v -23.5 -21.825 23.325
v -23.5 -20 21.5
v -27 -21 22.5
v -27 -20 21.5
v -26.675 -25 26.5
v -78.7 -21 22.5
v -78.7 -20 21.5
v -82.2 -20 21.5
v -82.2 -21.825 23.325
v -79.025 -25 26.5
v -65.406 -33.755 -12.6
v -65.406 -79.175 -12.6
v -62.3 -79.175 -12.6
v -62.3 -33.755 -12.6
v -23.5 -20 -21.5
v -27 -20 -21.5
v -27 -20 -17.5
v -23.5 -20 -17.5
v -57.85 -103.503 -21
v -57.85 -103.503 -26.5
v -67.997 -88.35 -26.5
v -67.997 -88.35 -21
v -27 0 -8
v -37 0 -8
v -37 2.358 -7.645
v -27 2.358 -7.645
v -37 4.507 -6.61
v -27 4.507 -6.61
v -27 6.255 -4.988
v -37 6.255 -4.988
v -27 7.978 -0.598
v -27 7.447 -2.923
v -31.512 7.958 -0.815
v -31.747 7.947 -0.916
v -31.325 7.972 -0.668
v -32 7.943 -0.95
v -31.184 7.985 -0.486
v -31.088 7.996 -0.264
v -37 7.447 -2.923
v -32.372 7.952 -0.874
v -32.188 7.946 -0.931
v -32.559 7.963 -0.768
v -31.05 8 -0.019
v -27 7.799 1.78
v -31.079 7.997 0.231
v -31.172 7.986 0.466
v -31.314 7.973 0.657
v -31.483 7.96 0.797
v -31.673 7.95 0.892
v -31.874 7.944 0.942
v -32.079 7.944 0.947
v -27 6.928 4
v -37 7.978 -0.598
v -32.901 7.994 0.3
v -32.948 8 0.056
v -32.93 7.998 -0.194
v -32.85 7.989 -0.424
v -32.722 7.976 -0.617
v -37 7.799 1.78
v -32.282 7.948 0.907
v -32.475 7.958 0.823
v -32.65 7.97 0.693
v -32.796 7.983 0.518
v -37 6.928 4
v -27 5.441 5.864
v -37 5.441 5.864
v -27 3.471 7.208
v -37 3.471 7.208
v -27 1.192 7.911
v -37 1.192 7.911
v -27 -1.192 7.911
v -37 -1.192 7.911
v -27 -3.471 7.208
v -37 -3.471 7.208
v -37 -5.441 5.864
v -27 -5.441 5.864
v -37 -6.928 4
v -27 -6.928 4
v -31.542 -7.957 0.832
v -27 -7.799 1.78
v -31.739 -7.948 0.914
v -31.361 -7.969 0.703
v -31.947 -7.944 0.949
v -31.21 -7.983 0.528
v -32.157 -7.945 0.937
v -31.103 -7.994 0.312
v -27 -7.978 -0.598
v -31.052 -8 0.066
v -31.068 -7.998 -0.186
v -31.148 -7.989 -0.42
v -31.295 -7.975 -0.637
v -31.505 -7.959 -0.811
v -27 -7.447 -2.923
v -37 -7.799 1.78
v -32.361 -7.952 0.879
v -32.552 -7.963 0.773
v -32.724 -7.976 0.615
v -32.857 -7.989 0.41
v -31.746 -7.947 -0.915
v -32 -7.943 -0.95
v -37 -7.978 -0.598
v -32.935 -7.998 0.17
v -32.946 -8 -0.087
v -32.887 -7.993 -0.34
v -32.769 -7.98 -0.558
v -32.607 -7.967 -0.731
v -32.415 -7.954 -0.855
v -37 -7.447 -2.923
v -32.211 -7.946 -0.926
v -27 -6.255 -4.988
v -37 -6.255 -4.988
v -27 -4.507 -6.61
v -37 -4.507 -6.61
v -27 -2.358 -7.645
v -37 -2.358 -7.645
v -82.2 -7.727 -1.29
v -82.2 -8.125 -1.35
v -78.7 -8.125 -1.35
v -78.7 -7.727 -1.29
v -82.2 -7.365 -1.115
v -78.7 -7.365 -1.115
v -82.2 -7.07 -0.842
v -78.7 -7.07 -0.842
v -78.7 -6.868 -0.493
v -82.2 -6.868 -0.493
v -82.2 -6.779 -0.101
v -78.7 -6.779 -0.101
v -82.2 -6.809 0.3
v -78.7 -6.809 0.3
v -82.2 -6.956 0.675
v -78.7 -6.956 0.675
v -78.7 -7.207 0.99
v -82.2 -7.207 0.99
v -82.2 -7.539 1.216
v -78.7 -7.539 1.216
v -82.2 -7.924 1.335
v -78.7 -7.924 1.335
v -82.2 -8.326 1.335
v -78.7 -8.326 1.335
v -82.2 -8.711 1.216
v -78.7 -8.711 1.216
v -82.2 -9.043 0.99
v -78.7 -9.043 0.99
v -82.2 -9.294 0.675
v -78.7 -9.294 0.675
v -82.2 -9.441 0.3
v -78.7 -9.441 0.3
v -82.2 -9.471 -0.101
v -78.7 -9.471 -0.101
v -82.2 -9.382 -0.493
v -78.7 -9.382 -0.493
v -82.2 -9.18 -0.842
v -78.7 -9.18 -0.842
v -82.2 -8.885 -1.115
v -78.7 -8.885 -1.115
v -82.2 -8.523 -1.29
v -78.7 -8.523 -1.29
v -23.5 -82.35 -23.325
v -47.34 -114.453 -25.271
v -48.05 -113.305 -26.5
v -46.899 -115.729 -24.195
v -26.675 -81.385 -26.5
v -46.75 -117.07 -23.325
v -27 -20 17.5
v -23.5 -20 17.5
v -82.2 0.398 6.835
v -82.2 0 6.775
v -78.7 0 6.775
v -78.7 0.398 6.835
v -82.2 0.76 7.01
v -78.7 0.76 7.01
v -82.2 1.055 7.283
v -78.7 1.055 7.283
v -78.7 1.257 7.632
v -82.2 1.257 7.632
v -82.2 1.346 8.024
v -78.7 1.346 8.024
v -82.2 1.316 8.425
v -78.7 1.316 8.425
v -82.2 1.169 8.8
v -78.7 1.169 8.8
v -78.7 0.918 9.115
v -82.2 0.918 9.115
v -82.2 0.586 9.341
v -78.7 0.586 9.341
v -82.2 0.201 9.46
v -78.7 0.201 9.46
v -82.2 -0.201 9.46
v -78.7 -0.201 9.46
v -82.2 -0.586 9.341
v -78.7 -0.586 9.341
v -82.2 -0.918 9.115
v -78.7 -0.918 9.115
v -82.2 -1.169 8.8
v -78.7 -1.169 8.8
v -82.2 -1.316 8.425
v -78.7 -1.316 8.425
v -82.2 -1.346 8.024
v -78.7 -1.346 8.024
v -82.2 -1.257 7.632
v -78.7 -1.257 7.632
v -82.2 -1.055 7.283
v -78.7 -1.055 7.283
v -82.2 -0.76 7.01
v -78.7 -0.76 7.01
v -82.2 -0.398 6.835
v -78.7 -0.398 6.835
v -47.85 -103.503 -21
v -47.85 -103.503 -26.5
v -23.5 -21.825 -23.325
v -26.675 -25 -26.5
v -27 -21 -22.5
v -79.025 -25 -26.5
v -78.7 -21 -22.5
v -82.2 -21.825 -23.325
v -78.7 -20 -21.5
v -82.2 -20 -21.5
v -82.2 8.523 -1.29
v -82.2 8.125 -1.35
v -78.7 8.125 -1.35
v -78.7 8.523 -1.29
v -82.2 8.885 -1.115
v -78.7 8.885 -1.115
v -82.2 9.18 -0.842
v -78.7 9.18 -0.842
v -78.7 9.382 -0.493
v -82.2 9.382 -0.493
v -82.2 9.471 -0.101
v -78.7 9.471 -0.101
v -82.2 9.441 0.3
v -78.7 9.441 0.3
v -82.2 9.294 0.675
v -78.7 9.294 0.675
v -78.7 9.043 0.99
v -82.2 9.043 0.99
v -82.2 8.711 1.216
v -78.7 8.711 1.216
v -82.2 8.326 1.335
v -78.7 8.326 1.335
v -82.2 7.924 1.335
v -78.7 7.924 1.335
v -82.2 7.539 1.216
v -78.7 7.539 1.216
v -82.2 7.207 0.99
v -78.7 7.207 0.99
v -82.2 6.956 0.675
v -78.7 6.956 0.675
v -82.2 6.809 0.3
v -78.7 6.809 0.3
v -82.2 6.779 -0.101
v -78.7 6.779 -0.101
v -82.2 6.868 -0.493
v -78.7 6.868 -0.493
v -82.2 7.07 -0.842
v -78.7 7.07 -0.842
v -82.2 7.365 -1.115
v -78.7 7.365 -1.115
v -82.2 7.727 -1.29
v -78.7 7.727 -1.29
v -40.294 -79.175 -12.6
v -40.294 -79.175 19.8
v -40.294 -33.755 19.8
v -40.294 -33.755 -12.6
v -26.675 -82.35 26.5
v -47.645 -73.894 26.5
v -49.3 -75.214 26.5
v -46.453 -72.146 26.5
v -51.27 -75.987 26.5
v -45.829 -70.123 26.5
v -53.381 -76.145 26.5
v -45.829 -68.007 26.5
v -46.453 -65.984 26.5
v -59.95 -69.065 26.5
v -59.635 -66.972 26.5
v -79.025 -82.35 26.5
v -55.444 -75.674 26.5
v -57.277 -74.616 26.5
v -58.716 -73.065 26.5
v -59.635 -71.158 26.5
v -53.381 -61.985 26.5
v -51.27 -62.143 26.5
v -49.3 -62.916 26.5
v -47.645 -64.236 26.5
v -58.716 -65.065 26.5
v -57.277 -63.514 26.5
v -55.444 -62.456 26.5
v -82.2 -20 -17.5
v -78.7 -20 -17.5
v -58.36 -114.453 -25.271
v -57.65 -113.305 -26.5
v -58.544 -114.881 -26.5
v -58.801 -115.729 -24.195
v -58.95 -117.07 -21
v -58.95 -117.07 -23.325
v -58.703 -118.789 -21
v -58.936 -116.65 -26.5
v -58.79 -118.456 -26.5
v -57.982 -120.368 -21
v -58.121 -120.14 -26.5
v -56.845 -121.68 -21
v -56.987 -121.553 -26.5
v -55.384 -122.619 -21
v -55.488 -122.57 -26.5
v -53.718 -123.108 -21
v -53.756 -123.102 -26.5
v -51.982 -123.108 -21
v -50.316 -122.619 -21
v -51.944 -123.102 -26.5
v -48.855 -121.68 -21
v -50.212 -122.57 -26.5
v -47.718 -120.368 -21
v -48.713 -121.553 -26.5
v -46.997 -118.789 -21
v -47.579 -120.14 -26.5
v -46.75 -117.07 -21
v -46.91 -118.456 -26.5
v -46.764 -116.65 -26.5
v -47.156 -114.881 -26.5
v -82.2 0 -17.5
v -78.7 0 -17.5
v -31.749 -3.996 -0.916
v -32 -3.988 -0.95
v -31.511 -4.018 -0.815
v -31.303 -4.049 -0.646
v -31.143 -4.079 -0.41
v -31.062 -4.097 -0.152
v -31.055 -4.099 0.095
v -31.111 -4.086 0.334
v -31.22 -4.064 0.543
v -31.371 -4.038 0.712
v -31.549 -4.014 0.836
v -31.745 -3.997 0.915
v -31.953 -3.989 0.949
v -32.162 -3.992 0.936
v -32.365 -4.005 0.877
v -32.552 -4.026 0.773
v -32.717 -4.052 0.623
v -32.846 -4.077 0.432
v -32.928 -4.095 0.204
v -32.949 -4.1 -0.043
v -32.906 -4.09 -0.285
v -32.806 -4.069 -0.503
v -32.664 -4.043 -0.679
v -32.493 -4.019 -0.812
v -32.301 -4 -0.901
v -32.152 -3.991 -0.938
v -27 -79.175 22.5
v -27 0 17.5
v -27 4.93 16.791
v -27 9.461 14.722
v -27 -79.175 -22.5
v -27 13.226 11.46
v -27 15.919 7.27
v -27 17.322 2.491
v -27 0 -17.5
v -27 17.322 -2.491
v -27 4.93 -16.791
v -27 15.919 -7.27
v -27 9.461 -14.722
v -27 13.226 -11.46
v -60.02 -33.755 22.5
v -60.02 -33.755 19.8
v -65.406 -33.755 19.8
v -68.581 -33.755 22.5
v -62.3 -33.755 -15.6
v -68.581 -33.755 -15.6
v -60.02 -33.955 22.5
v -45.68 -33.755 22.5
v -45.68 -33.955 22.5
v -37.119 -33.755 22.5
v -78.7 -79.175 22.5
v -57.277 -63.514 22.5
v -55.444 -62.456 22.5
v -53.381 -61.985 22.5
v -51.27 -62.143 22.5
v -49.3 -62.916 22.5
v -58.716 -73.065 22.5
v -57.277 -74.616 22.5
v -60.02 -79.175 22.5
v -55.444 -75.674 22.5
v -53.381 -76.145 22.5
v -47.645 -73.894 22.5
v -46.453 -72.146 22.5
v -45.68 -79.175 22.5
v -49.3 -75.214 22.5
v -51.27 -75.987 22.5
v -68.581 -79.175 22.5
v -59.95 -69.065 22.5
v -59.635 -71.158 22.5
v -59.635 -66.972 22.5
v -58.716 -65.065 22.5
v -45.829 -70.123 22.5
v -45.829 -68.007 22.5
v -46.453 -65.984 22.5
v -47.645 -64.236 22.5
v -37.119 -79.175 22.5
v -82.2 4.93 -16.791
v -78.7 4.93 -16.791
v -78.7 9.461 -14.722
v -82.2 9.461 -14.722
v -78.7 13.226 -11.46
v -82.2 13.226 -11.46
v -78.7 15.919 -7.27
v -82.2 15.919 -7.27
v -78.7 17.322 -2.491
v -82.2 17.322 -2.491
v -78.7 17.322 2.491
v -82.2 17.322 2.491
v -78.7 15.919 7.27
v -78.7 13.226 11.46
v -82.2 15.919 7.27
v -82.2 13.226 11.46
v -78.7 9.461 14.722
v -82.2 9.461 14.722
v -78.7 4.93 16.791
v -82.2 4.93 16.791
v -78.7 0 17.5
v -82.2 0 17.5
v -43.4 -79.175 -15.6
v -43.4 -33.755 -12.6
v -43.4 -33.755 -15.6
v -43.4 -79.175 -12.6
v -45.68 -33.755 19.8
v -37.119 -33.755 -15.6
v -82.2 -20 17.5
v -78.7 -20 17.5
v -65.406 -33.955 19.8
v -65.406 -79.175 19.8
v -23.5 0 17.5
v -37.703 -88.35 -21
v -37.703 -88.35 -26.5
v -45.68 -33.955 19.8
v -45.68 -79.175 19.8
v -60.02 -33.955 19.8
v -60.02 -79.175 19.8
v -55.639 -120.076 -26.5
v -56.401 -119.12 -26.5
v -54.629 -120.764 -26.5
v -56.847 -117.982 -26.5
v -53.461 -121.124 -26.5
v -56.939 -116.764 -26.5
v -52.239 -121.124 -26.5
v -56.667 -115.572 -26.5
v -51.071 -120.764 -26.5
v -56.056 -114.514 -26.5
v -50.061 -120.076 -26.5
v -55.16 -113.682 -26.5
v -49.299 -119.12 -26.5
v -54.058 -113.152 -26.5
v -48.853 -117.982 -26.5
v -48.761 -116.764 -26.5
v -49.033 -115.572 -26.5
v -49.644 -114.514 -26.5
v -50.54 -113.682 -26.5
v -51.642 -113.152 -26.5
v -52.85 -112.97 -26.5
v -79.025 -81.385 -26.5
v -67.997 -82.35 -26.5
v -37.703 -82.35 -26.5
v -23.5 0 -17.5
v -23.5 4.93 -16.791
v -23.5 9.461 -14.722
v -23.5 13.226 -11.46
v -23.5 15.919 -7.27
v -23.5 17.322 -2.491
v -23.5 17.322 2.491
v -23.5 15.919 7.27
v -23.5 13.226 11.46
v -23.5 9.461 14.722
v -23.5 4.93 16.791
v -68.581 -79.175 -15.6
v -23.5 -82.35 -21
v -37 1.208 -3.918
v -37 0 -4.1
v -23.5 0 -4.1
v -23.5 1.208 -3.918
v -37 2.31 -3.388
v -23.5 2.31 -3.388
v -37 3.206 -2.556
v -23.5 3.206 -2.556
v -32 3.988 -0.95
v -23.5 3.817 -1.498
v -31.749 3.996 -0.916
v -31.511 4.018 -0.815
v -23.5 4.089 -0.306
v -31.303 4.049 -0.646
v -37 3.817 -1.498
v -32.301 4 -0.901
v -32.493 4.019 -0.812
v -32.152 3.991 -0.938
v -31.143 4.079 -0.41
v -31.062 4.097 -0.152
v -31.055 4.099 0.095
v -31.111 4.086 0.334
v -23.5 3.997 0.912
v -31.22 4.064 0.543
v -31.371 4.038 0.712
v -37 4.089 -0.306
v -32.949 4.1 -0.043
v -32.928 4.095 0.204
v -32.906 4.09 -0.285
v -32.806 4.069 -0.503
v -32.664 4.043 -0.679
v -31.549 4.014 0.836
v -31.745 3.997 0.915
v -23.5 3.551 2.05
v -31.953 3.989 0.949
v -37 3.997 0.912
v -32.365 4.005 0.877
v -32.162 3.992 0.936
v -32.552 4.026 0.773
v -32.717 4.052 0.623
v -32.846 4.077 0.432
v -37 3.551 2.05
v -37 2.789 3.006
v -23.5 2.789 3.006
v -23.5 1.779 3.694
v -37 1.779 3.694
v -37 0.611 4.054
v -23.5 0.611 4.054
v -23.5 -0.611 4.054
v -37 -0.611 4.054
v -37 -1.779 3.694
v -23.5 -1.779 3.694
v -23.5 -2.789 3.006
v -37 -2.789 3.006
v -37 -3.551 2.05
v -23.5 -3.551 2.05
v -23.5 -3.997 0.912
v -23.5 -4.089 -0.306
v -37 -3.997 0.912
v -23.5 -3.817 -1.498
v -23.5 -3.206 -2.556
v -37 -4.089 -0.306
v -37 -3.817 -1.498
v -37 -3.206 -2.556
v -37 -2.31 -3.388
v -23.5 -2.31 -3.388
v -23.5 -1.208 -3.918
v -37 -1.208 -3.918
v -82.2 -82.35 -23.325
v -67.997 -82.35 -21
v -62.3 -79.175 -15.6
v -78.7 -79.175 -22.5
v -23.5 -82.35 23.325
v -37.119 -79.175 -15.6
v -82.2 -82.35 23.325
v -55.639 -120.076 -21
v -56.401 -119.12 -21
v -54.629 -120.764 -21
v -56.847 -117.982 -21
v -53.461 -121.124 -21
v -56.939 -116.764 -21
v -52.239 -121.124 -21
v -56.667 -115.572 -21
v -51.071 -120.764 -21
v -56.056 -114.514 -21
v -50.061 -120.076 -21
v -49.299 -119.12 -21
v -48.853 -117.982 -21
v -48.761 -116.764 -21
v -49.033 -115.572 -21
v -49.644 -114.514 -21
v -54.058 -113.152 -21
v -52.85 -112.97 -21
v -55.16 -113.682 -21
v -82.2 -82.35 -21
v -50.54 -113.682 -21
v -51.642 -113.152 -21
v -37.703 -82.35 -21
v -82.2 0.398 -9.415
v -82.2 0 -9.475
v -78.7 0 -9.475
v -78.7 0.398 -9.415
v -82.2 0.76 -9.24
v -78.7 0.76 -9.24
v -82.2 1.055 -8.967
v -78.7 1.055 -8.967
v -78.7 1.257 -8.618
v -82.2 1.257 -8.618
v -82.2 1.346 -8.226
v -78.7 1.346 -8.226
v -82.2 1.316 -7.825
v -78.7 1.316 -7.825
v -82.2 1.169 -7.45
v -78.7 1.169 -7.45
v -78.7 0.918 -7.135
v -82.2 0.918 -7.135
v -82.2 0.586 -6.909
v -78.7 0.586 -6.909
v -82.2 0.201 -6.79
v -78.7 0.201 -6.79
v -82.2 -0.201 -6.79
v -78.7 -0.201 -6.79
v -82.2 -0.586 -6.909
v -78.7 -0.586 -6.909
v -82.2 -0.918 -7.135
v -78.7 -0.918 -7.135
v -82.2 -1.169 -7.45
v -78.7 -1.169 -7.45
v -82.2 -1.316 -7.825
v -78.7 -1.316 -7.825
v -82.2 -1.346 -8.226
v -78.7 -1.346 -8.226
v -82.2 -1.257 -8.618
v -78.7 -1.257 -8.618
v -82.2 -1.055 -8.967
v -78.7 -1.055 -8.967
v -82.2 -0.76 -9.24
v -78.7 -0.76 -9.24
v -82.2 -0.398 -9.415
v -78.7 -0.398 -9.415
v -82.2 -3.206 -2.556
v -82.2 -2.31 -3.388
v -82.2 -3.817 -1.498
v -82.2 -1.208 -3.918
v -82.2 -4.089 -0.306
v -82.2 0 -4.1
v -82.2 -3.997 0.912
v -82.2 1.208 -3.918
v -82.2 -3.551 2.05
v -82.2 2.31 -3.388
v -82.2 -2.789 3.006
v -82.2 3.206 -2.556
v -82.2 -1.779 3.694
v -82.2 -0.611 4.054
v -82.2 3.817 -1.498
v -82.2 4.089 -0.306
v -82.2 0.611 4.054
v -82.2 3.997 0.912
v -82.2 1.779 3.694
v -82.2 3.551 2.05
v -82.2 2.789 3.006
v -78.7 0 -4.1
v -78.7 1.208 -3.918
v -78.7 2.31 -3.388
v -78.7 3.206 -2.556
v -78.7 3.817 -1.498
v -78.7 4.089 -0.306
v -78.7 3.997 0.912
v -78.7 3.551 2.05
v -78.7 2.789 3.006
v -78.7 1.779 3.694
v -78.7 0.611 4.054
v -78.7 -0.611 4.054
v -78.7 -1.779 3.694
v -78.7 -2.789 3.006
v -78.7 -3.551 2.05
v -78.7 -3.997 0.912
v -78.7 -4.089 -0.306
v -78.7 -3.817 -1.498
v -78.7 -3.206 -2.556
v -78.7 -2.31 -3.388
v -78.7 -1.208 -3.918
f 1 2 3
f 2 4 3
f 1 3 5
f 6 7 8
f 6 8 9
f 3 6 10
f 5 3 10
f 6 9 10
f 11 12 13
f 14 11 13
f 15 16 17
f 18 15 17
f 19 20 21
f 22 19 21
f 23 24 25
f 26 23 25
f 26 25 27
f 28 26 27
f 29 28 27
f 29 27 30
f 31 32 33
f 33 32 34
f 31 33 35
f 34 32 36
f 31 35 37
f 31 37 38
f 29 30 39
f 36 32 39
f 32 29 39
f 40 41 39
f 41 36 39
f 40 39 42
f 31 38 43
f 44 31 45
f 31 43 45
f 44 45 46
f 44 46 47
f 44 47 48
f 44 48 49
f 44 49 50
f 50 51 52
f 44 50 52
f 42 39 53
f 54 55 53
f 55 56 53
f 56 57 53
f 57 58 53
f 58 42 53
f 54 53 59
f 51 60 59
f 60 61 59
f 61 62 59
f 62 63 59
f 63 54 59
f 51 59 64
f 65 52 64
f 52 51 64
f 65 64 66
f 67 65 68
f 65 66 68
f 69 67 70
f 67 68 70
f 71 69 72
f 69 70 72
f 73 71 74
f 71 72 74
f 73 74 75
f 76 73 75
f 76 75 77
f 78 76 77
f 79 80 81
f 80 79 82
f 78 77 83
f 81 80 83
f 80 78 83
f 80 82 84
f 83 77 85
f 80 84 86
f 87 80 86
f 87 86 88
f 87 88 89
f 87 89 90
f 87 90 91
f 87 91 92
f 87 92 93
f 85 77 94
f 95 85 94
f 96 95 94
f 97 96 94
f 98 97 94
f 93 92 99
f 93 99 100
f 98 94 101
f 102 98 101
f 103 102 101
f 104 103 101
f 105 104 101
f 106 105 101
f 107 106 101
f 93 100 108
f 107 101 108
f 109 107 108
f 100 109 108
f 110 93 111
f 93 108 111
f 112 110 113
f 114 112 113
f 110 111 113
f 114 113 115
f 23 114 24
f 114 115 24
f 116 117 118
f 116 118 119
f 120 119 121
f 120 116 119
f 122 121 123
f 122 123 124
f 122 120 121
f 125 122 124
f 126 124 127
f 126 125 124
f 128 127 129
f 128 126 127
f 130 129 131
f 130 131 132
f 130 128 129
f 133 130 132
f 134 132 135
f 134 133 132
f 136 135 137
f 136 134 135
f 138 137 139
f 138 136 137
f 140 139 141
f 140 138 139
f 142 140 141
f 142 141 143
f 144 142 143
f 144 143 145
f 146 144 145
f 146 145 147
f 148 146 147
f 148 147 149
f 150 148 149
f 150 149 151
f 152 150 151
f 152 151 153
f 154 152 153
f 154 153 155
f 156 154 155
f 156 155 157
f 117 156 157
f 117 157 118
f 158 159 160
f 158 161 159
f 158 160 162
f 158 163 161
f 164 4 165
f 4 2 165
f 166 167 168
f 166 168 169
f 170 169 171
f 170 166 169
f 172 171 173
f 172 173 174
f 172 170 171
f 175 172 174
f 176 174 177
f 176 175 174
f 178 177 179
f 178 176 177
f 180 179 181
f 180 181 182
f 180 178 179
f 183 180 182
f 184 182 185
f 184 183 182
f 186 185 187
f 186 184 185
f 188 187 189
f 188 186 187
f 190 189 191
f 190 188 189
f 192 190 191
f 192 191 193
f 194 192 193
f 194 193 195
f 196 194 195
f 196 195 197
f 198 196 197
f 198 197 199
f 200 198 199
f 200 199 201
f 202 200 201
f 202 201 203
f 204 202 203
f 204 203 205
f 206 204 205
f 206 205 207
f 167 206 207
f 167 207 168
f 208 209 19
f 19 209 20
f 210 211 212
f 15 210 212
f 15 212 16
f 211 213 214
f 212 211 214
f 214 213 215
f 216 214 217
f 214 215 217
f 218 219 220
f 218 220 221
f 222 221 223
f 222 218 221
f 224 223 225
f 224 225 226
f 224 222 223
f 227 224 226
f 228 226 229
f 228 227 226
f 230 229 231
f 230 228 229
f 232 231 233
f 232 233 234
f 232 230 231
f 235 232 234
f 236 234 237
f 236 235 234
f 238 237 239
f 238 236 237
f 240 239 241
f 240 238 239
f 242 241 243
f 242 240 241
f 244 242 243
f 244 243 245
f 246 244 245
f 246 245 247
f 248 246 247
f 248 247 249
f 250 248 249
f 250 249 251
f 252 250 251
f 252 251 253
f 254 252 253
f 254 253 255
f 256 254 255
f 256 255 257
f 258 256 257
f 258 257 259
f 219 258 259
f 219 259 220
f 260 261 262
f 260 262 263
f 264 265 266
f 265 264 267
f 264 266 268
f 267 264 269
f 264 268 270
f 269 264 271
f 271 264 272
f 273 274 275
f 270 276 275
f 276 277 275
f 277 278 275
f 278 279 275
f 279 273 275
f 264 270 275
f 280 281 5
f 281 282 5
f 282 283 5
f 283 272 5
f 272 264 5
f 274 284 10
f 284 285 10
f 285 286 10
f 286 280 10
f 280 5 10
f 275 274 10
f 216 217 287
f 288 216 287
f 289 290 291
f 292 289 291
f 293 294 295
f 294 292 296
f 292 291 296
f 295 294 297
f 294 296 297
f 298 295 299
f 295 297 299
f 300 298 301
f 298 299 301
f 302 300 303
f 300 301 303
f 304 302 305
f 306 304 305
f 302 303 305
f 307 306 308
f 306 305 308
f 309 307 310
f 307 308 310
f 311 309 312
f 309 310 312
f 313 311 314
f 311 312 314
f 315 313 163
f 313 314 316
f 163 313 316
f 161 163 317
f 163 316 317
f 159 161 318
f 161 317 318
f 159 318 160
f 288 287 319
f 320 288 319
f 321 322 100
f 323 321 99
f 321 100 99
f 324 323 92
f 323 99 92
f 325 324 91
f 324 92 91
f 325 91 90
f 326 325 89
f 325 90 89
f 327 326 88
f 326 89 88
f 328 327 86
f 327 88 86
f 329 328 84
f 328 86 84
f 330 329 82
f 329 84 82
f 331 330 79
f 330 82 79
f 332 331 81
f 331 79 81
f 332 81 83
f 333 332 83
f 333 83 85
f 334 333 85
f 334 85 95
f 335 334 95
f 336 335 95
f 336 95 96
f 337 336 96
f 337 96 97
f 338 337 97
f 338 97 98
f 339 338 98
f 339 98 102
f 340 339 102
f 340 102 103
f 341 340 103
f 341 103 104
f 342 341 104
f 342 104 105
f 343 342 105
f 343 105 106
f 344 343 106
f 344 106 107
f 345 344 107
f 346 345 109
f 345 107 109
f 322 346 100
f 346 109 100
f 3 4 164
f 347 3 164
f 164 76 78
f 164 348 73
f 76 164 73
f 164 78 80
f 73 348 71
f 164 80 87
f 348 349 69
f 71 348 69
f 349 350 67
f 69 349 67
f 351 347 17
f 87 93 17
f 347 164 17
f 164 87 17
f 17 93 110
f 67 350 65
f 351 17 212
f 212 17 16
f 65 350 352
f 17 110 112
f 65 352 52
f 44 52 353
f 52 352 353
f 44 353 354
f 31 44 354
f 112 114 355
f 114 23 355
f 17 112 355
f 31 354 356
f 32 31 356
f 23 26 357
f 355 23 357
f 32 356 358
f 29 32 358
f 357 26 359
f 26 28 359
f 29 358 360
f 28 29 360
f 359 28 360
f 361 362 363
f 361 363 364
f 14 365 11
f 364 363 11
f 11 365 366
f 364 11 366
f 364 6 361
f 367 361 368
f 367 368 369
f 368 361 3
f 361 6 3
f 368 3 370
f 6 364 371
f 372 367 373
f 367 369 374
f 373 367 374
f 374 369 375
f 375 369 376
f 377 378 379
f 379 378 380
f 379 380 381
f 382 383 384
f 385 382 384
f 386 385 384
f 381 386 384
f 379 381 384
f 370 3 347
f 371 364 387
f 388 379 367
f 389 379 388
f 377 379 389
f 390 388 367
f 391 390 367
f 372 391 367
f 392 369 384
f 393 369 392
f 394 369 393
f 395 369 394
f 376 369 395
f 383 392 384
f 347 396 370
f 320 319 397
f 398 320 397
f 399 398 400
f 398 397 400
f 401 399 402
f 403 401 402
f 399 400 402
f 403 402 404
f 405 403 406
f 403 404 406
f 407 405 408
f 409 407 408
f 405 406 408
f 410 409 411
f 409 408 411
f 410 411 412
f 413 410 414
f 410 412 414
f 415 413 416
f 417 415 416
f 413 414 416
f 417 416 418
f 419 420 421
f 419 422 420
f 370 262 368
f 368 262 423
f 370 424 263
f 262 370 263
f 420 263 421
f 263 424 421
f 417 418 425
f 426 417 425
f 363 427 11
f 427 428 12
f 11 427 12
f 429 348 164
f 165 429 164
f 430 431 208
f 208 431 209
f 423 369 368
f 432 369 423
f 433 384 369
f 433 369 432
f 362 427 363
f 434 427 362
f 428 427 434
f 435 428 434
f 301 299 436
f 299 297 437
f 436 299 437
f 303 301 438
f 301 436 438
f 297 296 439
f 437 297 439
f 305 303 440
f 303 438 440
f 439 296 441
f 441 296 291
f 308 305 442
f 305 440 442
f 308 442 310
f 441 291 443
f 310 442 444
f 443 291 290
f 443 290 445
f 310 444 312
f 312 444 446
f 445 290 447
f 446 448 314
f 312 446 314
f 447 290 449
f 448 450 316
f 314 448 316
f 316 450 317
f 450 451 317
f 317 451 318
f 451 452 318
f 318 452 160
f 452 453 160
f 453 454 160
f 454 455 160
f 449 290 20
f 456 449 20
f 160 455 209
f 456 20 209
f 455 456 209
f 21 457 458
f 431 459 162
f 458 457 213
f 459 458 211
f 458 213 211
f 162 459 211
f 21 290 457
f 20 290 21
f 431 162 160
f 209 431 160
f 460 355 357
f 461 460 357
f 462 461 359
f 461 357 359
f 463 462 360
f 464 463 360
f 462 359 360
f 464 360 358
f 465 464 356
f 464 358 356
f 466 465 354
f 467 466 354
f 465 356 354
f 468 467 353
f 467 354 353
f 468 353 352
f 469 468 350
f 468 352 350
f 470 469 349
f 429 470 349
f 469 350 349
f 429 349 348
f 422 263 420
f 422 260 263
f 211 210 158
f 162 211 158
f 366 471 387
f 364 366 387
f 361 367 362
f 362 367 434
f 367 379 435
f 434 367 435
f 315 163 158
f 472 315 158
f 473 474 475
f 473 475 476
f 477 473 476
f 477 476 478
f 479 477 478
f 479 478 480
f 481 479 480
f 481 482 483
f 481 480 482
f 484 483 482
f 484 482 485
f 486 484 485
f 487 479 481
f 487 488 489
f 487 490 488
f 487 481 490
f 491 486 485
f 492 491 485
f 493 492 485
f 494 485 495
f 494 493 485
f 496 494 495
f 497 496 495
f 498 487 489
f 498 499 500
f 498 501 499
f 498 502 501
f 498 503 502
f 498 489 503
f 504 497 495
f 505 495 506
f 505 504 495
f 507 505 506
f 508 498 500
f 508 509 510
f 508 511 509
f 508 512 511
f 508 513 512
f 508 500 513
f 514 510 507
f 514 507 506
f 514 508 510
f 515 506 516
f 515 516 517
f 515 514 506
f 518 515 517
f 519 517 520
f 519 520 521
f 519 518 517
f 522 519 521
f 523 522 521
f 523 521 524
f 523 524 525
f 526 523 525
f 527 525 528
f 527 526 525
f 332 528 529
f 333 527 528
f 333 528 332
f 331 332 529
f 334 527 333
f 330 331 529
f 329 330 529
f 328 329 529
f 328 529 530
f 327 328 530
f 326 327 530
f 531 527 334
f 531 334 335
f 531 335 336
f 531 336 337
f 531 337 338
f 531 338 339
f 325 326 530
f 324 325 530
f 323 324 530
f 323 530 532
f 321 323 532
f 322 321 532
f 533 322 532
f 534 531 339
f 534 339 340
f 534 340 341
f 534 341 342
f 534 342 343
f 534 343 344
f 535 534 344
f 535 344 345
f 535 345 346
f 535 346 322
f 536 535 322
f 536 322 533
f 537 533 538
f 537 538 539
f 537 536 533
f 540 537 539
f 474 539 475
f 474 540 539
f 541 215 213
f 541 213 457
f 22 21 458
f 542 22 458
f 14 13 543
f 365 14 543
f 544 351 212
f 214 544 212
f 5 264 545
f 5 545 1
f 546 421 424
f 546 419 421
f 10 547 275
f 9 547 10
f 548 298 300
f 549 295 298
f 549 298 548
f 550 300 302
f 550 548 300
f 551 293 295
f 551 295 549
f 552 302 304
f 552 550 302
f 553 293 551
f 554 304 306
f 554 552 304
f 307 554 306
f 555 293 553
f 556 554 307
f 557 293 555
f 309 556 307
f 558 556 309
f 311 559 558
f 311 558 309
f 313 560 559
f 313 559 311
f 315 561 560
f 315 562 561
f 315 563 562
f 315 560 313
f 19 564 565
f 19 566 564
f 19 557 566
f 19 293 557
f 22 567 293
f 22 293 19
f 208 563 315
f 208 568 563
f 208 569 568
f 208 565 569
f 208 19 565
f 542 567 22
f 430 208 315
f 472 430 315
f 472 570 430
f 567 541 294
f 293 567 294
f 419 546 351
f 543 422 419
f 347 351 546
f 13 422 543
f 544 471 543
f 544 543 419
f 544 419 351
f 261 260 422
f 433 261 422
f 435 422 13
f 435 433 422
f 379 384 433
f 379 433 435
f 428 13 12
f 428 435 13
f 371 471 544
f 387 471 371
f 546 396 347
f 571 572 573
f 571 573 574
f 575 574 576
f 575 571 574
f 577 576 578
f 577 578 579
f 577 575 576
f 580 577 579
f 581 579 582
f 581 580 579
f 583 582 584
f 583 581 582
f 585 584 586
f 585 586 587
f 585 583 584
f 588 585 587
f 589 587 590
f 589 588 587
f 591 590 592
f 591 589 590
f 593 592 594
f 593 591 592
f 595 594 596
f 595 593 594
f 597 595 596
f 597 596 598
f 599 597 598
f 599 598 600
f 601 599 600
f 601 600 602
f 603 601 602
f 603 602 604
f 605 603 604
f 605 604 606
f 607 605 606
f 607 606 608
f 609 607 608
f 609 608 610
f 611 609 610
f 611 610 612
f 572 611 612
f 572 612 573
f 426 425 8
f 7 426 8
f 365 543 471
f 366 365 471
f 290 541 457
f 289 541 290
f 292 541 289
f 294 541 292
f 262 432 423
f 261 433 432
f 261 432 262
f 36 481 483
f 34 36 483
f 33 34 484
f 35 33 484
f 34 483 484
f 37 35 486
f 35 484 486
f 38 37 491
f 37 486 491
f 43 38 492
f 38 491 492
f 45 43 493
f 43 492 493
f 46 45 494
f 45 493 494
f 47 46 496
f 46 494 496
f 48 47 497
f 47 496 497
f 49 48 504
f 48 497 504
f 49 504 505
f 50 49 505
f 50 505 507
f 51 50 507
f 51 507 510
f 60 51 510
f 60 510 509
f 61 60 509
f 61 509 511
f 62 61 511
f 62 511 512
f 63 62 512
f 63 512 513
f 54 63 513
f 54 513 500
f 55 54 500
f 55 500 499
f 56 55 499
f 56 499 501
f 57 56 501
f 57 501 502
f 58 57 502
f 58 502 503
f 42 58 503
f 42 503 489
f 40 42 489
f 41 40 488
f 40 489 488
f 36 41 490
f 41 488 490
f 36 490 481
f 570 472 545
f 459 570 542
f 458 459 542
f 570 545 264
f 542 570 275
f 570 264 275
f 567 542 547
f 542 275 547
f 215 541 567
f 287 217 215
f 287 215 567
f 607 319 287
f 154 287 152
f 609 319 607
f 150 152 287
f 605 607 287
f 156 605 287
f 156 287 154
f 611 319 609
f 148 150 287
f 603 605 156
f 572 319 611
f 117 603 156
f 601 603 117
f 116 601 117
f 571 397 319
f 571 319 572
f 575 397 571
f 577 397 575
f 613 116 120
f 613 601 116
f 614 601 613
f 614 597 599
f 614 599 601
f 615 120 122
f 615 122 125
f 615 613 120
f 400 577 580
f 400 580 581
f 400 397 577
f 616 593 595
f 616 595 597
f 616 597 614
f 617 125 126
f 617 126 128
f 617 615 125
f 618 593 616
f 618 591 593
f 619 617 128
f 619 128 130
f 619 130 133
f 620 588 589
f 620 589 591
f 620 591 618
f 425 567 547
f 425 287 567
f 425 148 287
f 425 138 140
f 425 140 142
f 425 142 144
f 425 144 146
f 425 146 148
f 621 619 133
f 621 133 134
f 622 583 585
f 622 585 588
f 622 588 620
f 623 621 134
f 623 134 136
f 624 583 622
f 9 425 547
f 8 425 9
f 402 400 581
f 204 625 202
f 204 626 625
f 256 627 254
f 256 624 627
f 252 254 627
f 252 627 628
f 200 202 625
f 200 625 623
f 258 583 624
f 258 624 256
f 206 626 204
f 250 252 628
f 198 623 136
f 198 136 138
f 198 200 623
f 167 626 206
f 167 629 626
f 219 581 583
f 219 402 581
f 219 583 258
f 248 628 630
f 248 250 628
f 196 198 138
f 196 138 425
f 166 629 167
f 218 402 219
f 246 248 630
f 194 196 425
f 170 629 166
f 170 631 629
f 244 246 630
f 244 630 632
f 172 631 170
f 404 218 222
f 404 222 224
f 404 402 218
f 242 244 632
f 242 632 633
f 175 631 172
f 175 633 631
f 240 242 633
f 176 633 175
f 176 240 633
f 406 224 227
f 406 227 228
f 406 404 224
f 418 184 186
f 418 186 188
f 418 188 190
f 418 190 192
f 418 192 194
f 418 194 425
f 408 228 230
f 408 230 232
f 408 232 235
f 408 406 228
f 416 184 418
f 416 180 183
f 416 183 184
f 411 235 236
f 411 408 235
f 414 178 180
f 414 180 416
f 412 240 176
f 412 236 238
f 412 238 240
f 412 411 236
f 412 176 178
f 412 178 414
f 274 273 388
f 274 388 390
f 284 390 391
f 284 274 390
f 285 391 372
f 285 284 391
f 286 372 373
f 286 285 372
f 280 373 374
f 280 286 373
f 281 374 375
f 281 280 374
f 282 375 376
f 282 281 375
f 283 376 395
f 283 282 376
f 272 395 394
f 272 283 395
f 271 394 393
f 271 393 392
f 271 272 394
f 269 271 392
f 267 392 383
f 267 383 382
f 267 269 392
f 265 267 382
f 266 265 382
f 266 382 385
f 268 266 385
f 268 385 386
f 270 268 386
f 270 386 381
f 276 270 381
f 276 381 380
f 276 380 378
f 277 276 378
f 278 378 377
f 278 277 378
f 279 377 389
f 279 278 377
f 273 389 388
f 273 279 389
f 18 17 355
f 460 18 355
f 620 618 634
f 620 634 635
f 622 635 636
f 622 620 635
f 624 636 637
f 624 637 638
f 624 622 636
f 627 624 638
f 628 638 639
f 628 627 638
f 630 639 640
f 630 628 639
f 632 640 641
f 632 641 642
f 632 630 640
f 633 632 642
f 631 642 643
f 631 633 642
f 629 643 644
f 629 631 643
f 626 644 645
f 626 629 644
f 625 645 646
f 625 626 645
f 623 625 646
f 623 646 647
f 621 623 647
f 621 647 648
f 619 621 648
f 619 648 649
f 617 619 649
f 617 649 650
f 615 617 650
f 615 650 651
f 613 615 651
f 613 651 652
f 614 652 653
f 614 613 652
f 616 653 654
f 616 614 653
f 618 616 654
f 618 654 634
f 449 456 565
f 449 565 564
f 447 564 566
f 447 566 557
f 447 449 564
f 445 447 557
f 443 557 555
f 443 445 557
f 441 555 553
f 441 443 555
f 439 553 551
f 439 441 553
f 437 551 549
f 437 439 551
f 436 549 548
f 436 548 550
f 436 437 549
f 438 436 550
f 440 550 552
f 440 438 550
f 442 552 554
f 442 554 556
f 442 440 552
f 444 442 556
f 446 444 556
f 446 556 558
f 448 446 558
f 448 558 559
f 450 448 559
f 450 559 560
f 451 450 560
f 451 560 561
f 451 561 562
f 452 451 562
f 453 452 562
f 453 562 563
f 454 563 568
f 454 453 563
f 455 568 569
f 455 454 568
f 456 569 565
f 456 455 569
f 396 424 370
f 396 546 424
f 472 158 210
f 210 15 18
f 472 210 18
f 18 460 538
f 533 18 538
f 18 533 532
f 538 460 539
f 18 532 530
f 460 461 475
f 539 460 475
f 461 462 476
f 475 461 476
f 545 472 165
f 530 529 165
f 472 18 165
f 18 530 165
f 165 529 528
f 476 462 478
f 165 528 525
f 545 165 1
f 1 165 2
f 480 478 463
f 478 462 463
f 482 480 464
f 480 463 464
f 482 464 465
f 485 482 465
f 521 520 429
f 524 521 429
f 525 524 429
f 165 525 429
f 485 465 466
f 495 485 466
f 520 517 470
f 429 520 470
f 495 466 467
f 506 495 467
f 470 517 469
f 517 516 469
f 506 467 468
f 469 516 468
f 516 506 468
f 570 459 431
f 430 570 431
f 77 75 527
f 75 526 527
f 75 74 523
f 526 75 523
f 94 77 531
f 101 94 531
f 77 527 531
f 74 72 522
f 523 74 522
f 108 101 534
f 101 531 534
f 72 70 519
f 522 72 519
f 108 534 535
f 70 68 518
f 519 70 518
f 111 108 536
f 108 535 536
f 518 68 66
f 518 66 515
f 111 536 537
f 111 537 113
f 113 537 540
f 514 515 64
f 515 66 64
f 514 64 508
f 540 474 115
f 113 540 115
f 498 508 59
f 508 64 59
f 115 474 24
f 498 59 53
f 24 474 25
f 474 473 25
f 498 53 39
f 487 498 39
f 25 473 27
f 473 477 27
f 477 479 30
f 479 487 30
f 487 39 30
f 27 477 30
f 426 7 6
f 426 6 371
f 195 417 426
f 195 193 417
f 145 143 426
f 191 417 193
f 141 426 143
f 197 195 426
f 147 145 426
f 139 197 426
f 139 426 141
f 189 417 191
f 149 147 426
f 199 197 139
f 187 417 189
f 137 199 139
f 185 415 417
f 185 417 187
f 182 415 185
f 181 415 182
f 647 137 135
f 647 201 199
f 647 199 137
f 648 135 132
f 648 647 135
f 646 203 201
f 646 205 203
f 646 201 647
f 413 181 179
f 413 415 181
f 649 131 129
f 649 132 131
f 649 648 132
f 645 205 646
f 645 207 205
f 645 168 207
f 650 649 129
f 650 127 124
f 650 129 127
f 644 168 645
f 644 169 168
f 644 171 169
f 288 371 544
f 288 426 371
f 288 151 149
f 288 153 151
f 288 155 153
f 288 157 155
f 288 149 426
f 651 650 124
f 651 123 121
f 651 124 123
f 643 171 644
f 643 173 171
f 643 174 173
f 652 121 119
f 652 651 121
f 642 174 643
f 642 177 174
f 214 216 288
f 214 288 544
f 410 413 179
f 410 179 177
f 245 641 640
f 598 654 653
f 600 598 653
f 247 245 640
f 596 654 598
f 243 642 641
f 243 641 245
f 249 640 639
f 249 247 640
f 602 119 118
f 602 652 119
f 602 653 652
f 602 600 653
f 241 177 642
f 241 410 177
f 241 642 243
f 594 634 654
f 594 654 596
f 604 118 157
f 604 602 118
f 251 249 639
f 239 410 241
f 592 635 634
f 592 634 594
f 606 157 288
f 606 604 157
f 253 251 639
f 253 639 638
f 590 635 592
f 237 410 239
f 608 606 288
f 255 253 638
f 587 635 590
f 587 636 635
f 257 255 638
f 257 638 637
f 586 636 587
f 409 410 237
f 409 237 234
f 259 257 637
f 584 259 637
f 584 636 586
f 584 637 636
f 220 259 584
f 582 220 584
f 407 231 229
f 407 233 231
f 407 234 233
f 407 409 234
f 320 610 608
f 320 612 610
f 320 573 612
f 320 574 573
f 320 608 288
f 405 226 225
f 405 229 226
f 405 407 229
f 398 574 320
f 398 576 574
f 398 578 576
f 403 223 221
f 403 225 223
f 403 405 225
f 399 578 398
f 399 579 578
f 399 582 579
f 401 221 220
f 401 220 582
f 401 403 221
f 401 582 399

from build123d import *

# Parameters (mm, degrees)
SKETCH1_R                = 4.1
BOSS_EXTRUDE1_DEPTH      = 3.5
BOSS_EXTRUDE2_DEPTH      = 51.7
BOSS_EXTRUDE2_DEPTH_BACK = 3.5
CHAMFER2_SIZE            = 5
CUT_EXTRUDE1_REACH       = 112.079
SKETCH4_W                = 51.7
SKETCH4_H                = 45
BOSS_EXTRUDE3_START      = 3.5
SKETCH5_R                = 4.1
BOSS_EXTRUDE3_DEPTH      = 3.5
CUT_EXTRUDE3_REACH       = 104.062
SKETCH9_R                = 1.35
SKETCH10_W               = 58.7
SKETCH10_H               = 53
BOSS_EXTRUDE5_DEPTH      = 3.175
SKETCH26_R               = 7.1
CUT_EXTRUDE6_DEPTH       = 4
SKETCH27_W               = 3.175
SKETCH27_H               = 34.600130378
BOSS_EXTRUDE6_DEPTH      = 45.22
SKETCH29_R               = 4.1
BOSS_EXTRUDE8_DEPTH      = 5.5
CHAMFER3_SIZE            = 3.175
BOSS_EXTRUDE9_START      = 10
SKETCH30_R               = 8
SKETCH30_R_2             = 4.1
BOSS_EXTRUDE9_DEPTH      = 10
SKETCH31_R               = 0.95
CUT_EXTRUDE7_DEPTH       = 120.972242206
BOSS_EXTRUDE10_DEPTH     = 45.22
SKETCH33_W               = 5.386290257
SKETCH33_H               = 2.7
BOSS_EXTRUDE11_DEPTH     = 45.22
BOSS_EXTRUDE12_DEPTH     = 0.2


with BuildPart() as part:
    # Sketch1 → Boss-Extrude1 (new body)
    with BuildSketch(Plane(origin=(0, 0, 0), x_dir=(0, 0, -1), z_dir=(1, 0, 0))):
        with BuildLine():
            Line((-17.5, 0), (-17.5, -20))
            Line((-17.5, -20), (-22.5, -20))
            Line((-22.5, -20), (-22.5, -76))
            Line((-22.5, -76), (22.5, -76))
            Line((22.5, -76), (22.5, -20))
            Line((22.5, -20), (17.5, -20))
            Line((17.5, -20), (17.5, 0))
            ThreePointArc((17.5, 0), (0, 17.5), (-17.5, 0))
        make_face()
        Circle(SKETCH1_R, mode=Mode.SUBTRACT)
    extrude(amount=-BOSS_EXTRUDE1_DEPTH)

    # Sketch2 → Boss-Extrude2 (add, two sides: drawn at the far end of the back side and taken through both)
    with BuildSketch(Plane(origin=(0, 0, 0), x_dir=(0, 0, -1), z_dir=(1, 0, 0)).offset(-BOSS_EXTRUDE2_DEPTH_BACK)):
        Polygon((-22.5, -20), (-22.5, -76), (22.5, -76), (22.5, -20), (26.5, -20), (26.5, -79.175), (-26.5, -79.175), (-26.5, -20), align=None)
    extrude(amount=BOSS_EXTRUDE2_DEPTH + BOSS_EXTRUDE2_DEPTH_BACK)

    # Chamfer2
    chamfer2_edges = [part.edges().sort_by_distance(p)[0] for p in [
        (24.1, -20, -26.5),
        (24.1, -20, 26.5),
    ]]
    chamfer(chamfer2_edges, length=CHAMFER2_SIZE)

    # Sketch4 → Cut-Extrude1 (cut, up to next)
    with BuildSketch(Plane(origin=(0, -76, 0), x_dir=(1, 0, 0), z_dir=(0, 1, 0)), mode=Mode.PRIVATE) as cut_extrude1_sk1:
        with Locations((25.85, 0)):
            Rectangle(SKETCH4_W, SKETCH4_H)
    cut_extrude1_tool1 = extrude(cut_extrude1_sk1.sketch, amount=-CUT_EXTRUDE1_REACH, mode=Mode.PRIVATE) & part.part
    add(cut_extrude1_tool1.solids().sort_by_distance((25.85, -76, 0))[0], mode=Mode.SUBTRACT)

    # Sketch5 → Boss-Extrude3 (add)
    with BuildSketch(Plane(origin=(51.7, 0, 0), x_dir=(0, 0, -1), z_dir=(1, 0, 0)).offset(BOSS_EXTRUDE3_START)):
        with BuildLine():
            Line((21.5, -20), (17.5, -20))
            Line((17.5, -20), (17.5, 0))
            ThreePointArc((17.5, 0), (0, 17.5), (-17.5, 0))
            Line((-17.5, 0), (-17.5, -20))
            Line((-17.5, -20), (-21.5, -20))
            Line((-21.5, -20), (-26.5, -25))
            Line((-26.5, -25), (-26.5, -79.175))
            Line((-26.5, -79.175), (26.5, -79.175))
            Line((26.5, -79.175), (26.5, -25))
            Line((26.5, -25), (21.5, -20))
        make_face()
        Circle(SKETCH5_R, mode=Mode.SUBTRACT)
    extrude(amount=-BOSS_EXTRUDE3_DEPTH)

    # Sketch9 → Cut-Extrude3 (cut, up to next)
    with BuildSketch(Plane(origin=(55.2, 0, 0), x_dir=(0, 0, -1), z_dir=(1, 0, 0)), mode=Mode.PRIVATE) as cut_extrude3_sk1:
        with Locations((0, 8.125)):
            Circle(SKETCH9_R)
    cut_extrude3_tool1 = extrude(cut_extrude3_sk1.sketch, amount=-CUT_EXTRUDE3_REACH, mode=Mode.PRIVATE) & part.part
    # Sketch9 → Cut-Extrude3 (cut, up to next)
    with BuildSketch(Plane(origin=(55.2, 0, 0), x_dir=(0, 0, -1), z_dir=(1, 0, 0)), mode=Mode.PRIVATE) as cut_extrude3_sk2:
        with Locations((8.125, 0)):
            Circle(SKETCH9_R)
    cut_extrude3_tool2 = extrude(cut_extrude3_sk2.sketch, amount=-CUT_EXTRUDE3_REACH, mode=Mode.PRIVATE) & part.part
    # Sketch9 → Cut-Extrude3 (cut, up to next)
    with BuildSketch(Plane(origin=(55.2, 0, 0), x_dir=(0, 0, -1), z_dir=(1, 0, 0)), mode=Mode.PRIVATE) as cut_extrude3_sk3:
        with Locations((0, -8.125)):
            Circle(SKETCH9_R)
    cut_extrude3_tool3 = extrude(cut_extrude3_sk3.sketch, amount=-CUT_EXTRUDE3_REACH, mode=Mode.PRIVATE) & part.part
    # Sketch9 → Cut-Extrude3 (cut, up to next)
    with BuildSketch(Plane(origin=(55.2, 0, 0), x_dir=(0, 0, -1), z_dir=(1, 0, 0)), mode=Mode.PRIVATE) as cut_extrude3_sk4:
        with Locations((-8.125, 0)):
            Circle(SKETCH9_R)
    cut_extrude3_tool4 = extrude(cut_extrude3_sk4.sketch, amount=-CUT_EXTRUDE3_REACH, mode=Mode.PRIVATE) & part.part
    add(cut_extrude3_tool1.solids().sort_by_distance((55.2, 8.125, 0))[0], mode=Mode.SUBTRACT)
    add(cut_extrude3_tool2.solids().sort_by_distance((55.2, 0, -8.125))[0], mode=Mode.SUBTRACT)
    add(cut_extrude3_tool3.solids().sort_by_distance((55.2, -8.125, 0))[0], mode=Mode.SUBTRACT)
    add(cut_extrude3_tool4.solids().sort_by_distance((55.2, 0, 8.125))[0], mode=Mode.SUBTRACT)

    # Sketch10 → Boss-Extrude5 (add)
    with BuildSketch(Plane.XZ.offset(79.175)):
        with Locations((25.85, 0)):
            Rectangle(SKETCH10_W, SKETCH10_H)
    extrude(amount=BOSS_EXTRUDE5_DEPTH)

    # Sketch26 → Cut-Extrude6 (cut)
    with BuildSketch(Plane.XY.offset(26.5)):
        with Locations((25.85, -69.065)):
            Circle(SKETCH26_R)
    extrude(amount=-CUT_EXTRUDE6_DEPTH, mode=Mode.SUBTRACT)

    # Sketch27 → Boss-Extrude6 (add)
    with BuildSketch(Plane(origin=(0, -79.175, 0), x_dir=(1, 0, 0), z_dir=(0, 1, 0))):
        with Locations((39.993724488, -5.199934811)):
            Rectangle(SKETCH27_W, SKETCH27_H)
        with Locations((11.706275512, -5.199934811)):
            Rectangle(SKETCH27_W, SKETCH27_H)
    extrude(amount=BOSS_EXTRUDE6_DEPTH)

    # Sketch29 → Boss-Extrude8 (add)
    with BuildSketch(Plane(origin=(0, 0, -26.5), x_dir=(-1, 0, 0), z_dir=(0, 0, -1))):
        with BuildLine():
            Line((-40.997321429, -82.35), (-55.2, -82.35))
            Line((-55.2, -82.35), (-31.95, -117.07))
            ThreePointArc((-31.95, -117.07), (-25.85, -123.17), (-19.75, -117.07))
            Line((-19.75, -117.07), (3.5, -82.35))
            Line((3.5, -82.35), (-10.702678571, -82.35))
            Line((-10.702678571, -82.35), (-10.702678571, -88.35))
            Line((-10.702678571, -88.35), (-20.85, -103.503333333))
            Line((-20.85, -103.503333333), (-30.85, -103.503333333))
            Line((-30.85, -103.503333333), (-40.997321429, -88.35))
            Line((-40.997321429, -88.35), (-40.997321429, -82.35))
        make_face()
        with Locations(Location((-25.85, -117.07, 0), (0, 0, 90))):
            Circle(SKETCH29_R, mode=Mode.SUBTRACT)
    extrude(amount=-BOSS_EXTRUDE8_DEPTH)

    # Chamfer3
    chamfer3_edges = [part.edges().sort_by_distance(p)[0] for p in [
        (43.575, -99.71, -26.5),
        (8.125, -99.71, -26.5),
        (-3.5, -53.675, -26.5),
        (-3.5, -53.675, 26.5),
        (55.2, -53.675, 26.5),
        (55.2, -53.675, -26.5),
    ]]
    chamfer(chamfer3_edges, length=CHAMFER3_SIZE)

    # Sketch30 → Boss-Extrude9 (add)
    with BuildSketch(Plane(origin=(0, 0, 0), x_dir=(0, 0, -1), z_dir=(1, 0, 0)).offset(BOSS_EXTRUDE9_START)):
        Circle(SKETCH30_R)
        Circle(SKETCH30_R_2, mode=Mode.SUBTRACT)
    extrude(amount=-BOSS_EXTRUDE9_DEPTH)

    # Sketch31 → Cut-Extrude7 (cut, through all)
    with BuildSketch(Plane(origin=(0, -20, 0), x_dir=(1, 0, 0), z_dir=(0, 1, 0))):
        with Locations(Location((5, 0, 0), (0, 0, 90))):
            Circle(SKETCH31_R)
    extrude(amount=CUT_EXTRUDE7_DEPTH, mode=Mode.SUBTRACT)

    # Sketch32 → Boss-Extrude10 (add)
    with BuildSketch(Plane(origin=(0, -79.175, 0), x_dir=(1, 0, 0), z_dir=(0, 1, 0))):
        Polygon((13.293775512, 12.600036526), (16.4, 12.600036526), (16.4, 15.600130378), (10.118775512, 15.600130378), (10.118775512, 12.100130378), (13.293775512, 12.100130378), align=None)
    boss_extrude10 = extrude(amount=BOSS_EXTRUDE10_DEPTH)

    # Sketch33 → Boss-Extrude11 (add)
    with BuildSketch(Plane(origin=(0, -79.175, 0), x_dir=(1, 0, 0), z_dir=(0, 1, 0))):
        with Locations((15.986920641, -21.15)):
            Rectangle(SKETCH33_W, SKETCH33_H)
    boss_extrude11 = extrude(amount=BOSS_EXTRUDE11_DEPTH)

    # Mirror1: Boss-Extrude10, Boss-Extrude11 across plane
    add(boss_extrude10.mirror(Plane.ZY.offset(-25.85)))
    add(boss_extrude11.mirror(Plane.ZY.offset(-25.85)))

    # Sketch34 → Boss-Extrude12 (add)
    with BuildSketch(Plane(origin=(0, -33.955, 0), x_dir=(1, 0, 0), z_dir=(0, 1, 0))):
        Polygon((13.293775512, -19.8), (13.293775512, 12.600036526), (16.4, 12.600036526), (16.4, 15.600130378), (10.118775512, 15.600130378), (10.118775512, -22.5), (18.680065769, -22.5), (18.680065769, -19.8), align=None)
        Polygon((41.581224488, -22.5), (41.581224488, 15.600130378), (35.3, 15.600130378), (35.3, 12.600036526), (38.406224488, 12.600036526), (38.406224488, -19.8), (33.019934231, -19.8), (33.019934231, -22.5), align=None)
    extrude(amount=BOSS_EXTRUDE12_DEPTH)


with BuildPart() as body_2:
    # Mirror3: mirrored copy
    add(part.part.mirror(Plane.ZY.offset(13.5)))


solid = body_2.part
